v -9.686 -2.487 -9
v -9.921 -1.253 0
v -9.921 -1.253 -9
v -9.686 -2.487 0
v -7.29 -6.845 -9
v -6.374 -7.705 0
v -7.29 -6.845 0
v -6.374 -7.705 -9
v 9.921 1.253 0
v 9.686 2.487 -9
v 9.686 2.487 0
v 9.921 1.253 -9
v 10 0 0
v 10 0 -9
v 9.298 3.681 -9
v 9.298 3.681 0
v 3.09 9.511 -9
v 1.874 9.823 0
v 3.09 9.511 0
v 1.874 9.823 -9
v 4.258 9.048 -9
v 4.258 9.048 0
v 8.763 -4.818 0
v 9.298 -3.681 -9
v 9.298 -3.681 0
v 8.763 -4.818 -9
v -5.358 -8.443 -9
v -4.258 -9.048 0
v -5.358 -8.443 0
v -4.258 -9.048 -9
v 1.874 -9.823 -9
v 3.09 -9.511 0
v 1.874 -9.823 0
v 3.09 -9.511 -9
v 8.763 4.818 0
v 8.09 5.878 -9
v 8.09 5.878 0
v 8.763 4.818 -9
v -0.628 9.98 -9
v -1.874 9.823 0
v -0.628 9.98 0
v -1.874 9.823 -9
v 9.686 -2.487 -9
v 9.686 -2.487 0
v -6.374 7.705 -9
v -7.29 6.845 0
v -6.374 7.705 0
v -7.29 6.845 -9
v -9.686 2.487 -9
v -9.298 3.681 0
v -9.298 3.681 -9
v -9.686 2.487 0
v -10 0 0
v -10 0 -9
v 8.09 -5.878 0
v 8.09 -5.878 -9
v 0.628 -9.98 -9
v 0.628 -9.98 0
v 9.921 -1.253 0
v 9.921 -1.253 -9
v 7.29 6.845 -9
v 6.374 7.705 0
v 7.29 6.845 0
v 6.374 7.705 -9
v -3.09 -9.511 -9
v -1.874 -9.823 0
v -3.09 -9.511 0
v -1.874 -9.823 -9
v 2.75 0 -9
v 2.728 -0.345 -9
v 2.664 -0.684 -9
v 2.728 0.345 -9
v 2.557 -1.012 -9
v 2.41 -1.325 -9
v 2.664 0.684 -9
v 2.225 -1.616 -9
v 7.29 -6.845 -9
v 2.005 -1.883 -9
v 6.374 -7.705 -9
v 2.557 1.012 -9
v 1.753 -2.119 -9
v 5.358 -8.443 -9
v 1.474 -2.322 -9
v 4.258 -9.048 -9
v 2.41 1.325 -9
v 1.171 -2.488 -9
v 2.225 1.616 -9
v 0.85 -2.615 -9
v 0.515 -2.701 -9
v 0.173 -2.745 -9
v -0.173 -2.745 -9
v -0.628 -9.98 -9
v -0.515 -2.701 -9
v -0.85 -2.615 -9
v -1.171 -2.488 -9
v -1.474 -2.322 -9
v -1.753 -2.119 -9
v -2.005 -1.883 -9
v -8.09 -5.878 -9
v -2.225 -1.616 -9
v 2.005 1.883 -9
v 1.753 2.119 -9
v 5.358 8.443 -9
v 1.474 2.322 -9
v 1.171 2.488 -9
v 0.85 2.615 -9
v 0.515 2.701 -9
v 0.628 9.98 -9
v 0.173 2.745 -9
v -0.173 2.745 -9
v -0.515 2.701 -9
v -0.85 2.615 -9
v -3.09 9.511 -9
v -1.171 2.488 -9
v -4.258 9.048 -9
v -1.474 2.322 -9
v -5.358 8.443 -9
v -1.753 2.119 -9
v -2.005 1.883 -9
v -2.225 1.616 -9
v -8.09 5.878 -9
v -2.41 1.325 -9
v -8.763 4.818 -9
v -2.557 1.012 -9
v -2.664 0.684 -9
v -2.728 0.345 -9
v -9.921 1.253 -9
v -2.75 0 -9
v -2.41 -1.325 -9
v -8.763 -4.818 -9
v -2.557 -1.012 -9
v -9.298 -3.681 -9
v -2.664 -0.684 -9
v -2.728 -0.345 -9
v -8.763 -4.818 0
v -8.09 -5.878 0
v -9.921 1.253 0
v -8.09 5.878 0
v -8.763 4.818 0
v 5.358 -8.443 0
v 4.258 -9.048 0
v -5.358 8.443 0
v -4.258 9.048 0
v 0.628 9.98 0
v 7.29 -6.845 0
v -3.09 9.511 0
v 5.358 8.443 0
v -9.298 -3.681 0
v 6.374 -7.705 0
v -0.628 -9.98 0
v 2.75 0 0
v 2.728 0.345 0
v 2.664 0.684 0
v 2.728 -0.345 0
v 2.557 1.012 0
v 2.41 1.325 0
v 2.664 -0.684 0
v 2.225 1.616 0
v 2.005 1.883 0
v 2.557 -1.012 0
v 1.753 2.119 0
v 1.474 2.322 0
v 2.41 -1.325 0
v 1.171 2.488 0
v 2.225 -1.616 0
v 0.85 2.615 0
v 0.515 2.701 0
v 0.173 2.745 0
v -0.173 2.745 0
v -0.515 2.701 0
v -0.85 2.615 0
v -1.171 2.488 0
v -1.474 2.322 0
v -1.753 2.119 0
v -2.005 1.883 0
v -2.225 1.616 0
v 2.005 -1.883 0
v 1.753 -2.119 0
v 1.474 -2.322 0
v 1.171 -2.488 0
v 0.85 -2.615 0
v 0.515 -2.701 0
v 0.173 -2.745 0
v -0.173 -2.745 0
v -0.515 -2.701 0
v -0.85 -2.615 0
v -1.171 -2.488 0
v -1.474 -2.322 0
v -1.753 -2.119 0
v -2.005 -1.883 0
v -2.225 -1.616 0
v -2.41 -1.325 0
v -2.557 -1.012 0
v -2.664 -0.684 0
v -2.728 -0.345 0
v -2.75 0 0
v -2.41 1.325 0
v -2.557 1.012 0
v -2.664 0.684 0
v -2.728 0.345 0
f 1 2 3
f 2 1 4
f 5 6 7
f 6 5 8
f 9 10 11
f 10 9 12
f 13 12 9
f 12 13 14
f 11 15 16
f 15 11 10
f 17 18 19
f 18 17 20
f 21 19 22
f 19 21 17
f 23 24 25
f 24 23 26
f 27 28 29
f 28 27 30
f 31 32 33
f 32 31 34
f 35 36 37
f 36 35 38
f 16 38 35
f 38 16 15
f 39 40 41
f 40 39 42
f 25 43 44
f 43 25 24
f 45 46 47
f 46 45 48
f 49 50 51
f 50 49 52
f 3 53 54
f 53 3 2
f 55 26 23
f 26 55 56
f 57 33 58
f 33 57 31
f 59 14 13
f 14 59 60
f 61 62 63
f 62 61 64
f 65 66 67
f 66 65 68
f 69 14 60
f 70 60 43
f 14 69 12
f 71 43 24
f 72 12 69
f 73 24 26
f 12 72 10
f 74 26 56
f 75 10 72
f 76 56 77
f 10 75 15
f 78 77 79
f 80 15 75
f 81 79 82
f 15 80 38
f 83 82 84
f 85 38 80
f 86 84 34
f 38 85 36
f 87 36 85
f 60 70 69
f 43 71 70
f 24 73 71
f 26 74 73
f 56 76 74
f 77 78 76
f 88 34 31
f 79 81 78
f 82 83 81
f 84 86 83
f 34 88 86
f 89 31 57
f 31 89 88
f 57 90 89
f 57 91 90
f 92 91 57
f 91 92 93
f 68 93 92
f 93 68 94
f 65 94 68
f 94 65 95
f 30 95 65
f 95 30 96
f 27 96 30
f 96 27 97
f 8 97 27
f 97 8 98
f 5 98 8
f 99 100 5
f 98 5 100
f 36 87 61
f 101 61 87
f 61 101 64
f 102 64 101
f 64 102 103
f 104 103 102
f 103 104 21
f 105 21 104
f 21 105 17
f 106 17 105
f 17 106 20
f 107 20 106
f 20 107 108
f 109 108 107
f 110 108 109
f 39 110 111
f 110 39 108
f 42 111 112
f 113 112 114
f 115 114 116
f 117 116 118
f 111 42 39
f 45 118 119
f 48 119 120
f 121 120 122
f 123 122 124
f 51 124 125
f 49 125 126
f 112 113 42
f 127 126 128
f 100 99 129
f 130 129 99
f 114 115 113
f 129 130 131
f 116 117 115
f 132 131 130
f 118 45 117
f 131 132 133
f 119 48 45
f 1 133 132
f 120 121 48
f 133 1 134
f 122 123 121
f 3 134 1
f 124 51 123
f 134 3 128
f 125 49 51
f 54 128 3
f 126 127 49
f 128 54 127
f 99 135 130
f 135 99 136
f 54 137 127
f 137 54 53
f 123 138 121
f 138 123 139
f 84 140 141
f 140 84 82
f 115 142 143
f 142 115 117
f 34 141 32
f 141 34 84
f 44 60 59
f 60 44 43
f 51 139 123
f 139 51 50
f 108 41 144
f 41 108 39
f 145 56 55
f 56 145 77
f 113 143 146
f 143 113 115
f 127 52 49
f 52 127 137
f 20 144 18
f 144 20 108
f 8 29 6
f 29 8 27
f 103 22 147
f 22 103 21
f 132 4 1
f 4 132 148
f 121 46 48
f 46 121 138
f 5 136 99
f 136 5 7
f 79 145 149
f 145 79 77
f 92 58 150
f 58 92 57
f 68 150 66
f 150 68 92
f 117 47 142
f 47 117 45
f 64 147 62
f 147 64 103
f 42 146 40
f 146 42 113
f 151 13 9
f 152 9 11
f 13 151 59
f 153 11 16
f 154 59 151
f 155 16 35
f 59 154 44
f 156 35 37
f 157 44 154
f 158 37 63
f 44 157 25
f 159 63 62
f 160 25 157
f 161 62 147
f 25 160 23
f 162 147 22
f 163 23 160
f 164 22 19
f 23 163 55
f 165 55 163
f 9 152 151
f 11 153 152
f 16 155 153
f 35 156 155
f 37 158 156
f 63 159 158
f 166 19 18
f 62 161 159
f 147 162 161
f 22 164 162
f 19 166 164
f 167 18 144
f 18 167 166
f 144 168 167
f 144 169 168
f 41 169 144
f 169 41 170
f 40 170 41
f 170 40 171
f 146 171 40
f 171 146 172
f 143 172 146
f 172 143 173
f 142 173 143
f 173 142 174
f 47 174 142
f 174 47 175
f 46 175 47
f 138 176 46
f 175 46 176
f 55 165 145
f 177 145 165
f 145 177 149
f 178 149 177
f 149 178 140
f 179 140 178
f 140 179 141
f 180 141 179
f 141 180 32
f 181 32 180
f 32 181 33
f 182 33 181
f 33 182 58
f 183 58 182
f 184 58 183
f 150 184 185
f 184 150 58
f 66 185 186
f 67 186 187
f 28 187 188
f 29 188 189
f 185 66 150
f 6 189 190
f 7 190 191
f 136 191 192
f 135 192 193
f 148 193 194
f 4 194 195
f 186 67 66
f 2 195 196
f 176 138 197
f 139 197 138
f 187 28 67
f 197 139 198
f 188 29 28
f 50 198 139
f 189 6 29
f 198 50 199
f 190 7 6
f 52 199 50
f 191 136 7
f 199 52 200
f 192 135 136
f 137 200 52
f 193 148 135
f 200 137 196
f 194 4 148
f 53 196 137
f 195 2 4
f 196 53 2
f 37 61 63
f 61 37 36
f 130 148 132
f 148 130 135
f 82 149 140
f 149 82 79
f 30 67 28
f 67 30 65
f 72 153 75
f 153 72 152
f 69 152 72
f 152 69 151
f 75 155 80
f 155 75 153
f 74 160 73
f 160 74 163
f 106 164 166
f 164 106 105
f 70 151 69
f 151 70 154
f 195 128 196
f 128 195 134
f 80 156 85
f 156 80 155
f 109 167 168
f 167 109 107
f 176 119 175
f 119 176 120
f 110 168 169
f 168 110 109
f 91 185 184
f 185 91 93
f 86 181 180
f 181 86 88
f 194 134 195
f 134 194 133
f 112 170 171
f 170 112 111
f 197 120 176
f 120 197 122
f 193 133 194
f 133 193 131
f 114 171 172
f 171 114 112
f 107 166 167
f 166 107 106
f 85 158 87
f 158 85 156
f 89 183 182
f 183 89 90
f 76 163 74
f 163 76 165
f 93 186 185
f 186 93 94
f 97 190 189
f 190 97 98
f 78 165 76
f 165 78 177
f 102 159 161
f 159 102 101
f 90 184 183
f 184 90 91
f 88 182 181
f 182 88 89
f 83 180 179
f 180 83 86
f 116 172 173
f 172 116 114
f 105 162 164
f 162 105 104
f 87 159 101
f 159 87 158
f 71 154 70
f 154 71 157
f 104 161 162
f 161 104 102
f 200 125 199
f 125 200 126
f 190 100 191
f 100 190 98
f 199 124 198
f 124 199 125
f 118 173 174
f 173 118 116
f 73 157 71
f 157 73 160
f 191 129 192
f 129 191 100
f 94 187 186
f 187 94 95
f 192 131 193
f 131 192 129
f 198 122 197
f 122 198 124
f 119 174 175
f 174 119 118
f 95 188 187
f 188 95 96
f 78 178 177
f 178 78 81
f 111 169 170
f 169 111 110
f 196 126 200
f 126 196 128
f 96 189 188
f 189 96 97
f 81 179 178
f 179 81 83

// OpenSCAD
$fn = 50;


difference() {
	union() {
		translate(v = [0, 0, -9.0000000000]) {
			cylinder(h = 9, r = 10.0000000000);
		}
		cylinder(h = 0, r = 19.0000000000);
	}
	union() {
		#translate(v = [0, 0, -9]) {
			cylinder(h = 9, r = 2.7500000000);
		}
	}
}
